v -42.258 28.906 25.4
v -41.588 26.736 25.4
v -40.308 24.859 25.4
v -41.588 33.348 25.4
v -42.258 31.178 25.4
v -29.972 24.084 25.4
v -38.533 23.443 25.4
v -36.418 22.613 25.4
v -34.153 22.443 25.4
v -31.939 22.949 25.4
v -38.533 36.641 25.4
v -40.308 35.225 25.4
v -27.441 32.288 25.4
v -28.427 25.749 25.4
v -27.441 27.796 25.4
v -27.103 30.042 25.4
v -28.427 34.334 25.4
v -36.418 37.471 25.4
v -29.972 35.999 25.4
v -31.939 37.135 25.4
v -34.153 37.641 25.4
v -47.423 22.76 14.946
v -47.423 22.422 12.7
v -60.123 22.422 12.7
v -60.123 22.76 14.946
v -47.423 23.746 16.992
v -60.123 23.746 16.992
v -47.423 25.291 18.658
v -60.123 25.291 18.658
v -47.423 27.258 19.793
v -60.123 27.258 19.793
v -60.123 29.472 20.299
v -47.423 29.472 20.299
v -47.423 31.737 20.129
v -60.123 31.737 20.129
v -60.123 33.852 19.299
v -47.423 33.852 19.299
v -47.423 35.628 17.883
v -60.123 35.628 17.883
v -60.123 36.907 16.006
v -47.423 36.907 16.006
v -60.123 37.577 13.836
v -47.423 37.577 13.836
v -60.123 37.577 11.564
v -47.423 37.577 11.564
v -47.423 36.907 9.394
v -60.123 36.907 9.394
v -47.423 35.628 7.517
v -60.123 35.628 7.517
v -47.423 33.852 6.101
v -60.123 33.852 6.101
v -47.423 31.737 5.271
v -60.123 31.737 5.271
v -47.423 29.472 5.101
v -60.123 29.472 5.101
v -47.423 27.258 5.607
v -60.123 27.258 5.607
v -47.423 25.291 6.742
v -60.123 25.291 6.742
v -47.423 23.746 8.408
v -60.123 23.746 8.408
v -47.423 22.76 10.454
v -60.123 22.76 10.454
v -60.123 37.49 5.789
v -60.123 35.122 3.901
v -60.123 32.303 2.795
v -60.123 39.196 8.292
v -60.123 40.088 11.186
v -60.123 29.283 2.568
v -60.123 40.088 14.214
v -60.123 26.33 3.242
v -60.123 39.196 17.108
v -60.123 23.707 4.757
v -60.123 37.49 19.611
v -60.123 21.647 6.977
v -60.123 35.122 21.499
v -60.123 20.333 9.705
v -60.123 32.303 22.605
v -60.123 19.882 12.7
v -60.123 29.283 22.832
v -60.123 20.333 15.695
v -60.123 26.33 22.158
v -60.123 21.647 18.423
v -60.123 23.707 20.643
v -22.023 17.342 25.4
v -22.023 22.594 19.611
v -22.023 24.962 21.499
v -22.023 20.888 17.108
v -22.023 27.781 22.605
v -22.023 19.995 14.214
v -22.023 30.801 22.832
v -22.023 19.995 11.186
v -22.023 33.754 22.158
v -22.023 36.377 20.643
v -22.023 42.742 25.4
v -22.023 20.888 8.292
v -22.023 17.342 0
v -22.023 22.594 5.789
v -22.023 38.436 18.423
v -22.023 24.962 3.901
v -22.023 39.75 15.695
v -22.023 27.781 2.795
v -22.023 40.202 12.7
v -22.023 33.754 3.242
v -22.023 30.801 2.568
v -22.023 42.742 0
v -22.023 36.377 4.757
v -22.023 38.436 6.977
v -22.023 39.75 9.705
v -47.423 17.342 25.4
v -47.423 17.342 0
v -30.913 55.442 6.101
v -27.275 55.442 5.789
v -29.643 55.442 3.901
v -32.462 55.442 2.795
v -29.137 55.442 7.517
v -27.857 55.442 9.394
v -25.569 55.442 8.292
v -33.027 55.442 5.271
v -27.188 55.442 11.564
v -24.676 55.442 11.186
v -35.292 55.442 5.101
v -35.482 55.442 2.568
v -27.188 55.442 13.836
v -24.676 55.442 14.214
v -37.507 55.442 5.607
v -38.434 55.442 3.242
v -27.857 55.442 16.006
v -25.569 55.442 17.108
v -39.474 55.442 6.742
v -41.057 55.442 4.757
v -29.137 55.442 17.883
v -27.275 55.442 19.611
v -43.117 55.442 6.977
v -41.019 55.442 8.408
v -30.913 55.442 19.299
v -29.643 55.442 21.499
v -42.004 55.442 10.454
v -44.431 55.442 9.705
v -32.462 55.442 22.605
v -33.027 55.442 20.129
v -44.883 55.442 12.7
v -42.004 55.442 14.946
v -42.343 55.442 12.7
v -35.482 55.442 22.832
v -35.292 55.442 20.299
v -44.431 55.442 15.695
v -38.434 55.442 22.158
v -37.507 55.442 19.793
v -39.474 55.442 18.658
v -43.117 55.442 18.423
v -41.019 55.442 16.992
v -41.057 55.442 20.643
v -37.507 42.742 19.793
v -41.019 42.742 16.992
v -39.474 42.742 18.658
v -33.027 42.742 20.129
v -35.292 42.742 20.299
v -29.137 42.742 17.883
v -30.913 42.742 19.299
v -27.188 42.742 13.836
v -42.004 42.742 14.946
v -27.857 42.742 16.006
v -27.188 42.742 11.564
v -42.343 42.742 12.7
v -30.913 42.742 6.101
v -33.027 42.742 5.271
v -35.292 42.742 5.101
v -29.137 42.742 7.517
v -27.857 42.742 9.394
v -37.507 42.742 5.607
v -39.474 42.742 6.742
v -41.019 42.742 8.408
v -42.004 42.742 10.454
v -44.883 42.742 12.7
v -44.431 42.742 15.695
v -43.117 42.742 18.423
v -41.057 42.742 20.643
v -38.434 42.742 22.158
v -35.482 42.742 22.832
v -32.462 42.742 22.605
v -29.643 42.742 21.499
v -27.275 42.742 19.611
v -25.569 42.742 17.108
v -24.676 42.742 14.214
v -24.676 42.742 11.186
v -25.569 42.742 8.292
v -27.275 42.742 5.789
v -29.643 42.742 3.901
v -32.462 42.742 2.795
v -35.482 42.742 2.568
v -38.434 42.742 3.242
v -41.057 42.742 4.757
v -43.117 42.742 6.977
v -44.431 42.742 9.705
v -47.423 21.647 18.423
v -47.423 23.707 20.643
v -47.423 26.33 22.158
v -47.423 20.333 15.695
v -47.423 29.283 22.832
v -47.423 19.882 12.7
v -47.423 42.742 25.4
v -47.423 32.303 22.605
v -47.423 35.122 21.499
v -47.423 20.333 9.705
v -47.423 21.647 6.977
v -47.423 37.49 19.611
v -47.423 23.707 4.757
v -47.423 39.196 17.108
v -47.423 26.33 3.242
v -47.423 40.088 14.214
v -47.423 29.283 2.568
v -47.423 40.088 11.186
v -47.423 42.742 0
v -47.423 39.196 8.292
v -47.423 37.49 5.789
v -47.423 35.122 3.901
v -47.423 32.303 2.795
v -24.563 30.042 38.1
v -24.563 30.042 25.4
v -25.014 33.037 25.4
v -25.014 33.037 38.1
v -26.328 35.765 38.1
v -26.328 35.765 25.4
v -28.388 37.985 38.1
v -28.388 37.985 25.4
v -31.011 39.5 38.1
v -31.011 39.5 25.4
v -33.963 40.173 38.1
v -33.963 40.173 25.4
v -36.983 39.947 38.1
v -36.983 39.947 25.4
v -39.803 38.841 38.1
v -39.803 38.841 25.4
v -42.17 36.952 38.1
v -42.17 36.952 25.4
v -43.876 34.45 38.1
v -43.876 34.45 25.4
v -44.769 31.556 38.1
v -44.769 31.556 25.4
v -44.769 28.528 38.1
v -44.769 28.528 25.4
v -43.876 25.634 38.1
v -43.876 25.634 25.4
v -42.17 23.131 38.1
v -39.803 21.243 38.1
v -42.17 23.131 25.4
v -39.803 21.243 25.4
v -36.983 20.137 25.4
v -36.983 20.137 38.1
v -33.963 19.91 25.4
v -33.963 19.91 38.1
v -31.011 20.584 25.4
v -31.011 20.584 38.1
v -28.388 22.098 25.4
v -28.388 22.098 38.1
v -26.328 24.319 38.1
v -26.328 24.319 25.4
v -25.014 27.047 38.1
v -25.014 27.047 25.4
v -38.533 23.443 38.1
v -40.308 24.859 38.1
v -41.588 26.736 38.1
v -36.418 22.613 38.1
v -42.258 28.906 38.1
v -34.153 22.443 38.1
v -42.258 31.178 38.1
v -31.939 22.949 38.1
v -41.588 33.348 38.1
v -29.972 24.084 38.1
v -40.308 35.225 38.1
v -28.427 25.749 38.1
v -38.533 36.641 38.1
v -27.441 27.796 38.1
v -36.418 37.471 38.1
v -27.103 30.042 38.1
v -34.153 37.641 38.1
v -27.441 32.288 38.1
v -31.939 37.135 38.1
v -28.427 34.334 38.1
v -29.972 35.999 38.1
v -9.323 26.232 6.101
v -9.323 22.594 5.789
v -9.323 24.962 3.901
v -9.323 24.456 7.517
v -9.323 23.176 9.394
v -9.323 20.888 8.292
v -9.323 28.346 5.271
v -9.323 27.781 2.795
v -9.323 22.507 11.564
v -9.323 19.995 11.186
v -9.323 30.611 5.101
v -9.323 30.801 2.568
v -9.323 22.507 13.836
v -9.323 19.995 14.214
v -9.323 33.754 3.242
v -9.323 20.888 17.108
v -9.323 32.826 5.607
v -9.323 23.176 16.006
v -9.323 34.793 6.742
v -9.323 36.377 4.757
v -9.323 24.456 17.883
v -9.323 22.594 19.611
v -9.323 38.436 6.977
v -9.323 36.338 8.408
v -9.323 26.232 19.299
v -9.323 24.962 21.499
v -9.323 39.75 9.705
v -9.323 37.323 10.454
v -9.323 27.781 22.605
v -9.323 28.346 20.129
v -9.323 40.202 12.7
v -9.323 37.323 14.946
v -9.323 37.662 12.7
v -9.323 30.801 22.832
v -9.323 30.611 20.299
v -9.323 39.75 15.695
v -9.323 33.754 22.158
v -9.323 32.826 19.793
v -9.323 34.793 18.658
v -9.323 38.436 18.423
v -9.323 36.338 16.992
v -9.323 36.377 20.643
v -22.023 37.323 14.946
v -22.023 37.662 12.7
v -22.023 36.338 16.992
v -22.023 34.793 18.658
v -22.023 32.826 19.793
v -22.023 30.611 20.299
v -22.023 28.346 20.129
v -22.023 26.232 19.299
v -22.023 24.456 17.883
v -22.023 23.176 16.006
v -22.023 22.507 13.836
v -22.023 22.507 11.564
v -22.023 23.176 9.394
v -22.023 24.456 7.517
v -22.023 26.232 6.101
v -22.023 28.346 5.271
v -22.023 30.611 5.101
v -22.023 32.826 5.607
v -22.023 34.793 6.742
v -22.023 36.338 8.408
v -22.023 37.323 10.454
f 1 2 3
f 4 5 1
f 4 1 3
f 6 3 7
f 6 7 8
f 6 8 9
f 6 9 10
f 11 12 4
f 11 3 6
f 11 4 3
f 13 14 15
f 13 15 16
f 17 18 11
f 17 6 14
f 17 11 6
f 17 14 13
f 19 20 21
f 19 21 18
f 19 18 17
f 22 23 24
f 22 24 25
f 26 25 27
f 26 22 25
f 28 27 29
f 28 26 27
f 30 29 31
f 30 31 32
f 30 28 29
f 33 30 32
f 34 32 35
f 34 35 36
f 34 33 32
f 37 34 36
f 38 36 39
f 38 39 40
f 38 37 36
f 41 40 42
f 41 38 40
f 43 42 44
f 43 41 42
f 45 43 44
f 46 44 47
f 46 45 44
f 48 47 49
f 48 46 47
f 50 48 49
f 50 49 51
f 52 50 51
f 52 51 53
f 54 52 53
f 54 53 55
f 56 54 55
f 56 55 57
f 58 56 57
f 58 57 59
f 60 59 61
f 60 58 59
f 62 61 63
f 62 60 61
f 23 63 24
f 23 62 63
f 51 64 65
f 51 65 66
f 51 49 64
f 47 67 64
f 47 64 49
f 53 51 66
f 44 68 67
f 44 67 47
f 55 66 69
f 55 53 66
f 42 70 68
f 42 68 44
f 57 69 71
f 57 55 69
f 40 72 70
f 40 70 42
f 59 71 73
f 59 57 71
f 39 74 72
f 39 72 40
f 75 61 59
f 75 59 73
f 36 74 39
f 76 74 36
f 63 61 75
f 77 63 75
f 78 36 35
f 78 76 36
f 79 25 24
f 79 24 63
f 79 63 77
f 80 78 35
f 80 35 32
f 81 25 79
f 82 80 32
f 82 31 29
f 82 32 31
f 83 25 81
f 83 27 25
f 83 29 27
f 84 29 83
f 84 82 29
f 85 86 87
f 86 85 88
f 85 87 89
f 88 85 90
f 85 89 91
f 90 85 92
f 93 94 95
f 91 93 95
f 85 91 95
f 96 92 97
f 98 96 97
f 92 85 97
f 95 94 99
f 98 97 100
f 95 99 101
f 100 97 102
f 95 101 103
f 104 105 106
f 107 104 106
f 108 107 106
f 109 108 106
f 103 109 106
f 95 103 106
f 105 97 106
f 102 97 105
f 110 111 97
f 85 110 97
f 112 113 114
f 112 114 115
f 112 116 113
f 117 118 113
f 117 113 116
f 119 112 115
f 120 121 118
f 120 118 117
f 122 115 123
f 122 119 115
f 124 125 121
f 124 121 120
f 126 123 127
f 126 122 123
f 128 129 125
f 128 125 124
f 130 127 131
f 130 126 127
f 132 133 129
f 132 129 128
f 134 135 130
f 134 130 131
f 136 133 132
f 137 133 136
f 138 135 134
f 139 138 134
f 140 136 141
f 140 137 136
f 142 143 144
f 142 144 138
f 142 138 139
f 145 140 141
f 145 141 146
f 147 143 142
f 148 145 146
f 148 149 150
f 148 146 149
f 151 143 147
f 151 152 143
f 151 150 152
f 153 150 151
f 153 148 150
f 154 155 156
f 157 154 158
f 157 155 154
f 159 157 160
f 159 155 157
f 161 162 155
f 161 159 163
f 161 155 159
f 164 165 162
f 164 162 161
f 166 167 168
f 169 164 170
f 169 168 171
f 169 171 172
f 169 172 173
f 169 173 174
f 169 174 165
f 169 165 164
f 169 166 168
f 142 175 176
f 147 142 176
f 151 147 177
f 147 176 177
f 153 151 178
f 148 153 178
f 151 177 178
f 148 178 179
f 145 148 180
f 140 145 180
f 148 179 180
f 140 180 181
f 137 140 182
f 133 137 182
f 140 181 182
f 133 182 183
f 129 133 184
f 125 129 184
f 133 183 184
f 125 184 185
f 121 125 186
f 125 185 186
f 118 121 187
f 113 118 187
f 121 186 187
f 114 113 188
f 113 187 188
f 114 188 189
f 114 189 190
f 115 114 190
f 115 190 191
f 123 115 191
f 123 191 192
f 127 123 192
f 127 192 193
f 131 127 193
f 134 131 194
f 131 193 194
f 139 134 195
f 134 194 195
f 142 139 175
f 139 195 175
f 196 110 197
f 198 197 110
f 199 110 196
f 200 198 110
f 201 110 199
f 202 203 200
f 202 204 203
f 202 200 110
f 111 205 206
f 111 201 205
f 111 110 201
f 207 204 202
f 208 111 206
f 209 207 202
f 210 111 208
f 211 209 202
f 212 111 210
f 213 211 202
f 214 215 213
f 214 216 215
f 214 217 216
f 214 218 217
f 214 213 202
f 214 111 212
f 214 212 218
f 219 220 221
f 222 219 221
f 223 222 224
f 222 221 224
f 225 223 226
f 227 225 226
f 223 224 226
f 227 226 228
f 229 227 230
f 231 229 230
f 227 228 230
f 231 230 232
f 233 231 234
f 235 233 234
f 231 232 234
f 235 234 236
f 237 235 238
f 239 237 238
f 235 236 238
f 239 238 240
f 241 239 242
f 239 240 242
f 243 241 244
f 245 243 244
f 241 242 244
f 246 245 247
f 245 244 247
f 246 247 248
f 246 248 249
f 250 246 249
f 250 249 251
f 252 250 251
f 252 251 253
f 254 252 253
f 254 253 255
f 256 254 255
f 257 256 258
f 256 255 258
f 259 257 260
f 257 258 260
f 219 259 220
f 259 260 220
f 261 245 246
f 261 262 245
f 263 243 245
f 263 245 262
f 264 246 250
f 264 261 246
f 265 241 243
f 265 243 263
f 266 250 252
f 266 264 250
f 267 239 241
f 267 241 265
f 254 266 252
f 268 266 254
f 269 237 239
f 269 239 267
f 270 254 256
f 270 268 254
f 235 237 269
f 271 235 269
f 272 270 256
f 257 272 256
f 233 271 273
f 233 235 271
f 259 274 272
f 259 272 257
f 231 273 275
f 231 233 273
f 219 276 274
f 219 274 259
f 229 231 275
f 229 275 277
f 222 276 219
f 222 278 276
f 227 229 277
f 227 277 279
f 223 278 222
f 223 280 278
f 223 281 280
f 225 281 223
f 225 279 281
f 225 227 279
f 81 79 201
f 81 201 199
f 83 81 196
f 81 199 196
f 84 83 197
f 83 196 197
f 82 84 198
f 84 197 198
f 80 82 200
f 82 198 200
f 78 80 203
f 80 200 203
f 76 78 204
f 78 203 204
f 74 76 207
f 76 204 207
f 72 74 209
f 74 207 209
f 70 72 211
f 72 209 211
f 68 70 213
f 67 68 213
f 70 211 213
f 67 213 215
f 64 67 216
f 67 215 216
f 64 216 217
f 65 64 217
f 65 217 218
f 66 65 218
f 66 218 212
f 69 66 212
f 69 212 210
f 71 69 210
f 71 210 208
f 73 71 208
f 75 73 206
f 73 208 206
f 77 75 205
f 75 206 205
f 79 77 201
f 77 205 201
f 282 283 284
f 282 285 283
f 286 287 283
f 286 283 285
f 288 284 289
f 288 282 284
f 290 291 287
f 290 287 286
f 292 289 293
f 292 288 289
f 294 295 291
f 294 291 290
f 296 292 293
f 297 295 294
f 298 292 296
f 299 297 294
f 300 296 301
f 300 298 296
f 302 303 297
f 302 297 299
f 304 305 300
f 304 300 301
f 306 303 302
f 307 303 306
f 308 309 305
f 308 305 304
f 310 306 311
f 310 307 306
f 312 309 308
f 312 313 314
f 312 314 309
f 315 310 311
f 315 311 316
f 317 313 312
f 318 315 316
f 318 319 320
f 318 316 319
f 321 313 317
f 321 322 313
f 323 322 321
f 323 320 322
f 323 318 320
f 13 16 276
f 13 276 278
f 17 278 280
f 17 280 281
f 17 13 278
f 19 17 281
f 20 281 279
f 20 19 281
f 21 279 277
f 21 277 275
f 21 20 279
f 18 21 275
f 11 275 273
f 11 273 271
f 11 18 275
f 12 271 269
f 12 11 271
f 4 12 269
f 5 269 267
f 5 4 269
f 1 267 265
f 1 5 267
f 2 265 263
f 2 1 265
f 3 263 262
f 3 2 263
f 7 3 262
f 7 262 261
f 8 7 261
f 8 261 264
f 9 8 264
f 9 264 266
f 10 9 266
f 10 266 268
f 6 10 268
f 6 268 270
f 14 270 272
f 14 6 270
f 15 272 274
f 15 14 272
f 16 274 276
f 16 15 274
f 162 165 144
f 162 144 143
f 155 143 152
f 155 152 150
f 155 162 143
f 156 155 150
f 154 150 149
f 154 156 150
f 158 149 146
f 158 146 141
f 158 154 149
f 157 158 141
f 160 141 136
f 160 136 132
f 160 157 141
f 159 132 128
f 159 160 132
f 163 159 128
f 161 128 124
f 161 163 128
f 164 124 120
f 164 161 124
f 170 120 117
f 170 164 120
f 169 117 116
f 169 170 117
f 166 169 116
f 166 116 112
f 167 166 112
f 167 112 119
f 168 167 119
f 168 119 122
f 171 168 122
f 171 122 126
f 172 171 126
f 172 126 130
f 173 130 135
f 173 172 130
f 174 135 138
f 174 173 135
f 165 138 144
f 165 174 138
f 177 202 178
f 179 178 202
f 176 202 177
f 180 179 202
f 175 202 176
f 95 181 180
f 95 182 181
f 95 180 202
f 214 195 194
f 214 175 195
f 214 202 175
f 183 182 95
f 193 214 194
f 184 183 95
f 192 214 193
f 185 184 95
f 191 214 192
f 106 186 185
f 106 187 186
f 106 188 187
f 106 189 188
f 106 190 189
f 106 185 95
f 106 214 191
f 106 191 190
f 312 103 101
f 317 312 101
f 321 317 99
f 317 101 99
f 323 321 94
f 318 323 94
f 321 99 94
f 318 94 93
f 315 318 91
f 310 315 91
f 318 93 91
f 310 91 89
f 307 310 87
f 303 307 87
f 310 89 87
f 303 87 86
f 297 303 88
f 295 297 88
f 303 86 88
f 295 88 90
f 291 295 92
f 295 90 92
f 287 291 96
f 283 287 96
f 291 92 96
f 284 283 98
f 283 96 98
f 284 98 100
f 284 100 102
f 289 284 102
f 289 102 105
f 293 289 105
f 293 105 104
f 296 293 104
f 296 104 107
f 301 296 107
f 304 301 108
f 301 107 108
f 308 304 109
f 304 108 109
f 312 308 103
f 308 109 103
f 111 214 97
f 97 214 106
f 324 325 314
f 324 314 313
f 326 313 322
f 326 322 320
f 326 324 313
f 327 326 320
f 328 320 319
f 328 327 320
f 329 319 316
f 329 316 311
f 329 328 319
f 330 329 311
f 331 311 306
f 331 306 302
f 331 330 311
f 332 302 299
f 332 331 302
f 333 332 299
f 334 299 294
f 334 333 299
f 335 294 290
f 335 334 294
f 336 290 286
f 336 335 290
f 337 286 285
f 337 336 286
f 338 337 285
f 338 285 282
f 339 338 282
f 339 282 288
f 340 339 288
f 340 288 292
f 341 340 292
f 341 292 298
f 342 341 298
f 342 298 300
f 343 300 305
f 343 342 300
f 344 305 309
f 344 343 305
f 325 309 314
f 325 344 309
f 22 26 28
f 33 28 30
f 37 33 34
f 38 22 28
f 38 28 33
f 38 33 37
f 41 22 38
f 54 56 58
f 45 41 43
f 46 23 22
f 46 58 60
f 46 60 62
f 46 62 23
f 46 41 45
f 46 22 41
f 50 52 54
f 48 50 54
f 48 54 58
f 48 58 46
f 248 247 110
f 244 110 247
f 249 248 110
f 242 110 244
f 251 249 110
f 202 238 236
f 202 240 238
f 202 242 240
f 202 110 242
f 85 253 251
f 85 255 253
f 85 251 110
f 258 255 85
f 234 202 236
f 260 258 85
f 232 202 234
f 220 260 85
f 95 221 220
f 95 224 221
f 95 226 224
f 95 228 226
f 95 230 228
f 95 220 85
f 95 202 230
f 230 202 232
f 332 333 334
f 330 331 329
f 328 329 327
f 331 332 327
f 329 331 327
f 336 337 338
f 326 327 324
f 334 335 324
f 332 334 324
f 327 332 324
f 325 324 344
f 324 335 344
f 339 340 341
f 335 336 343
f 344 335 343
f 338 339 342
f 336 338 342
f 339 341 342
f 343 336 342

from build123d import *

# Parameters (mm, degrees)
F0_W     = 25.4
F0_H     = 25.4
F1_DEPTH = 25.4
F3_R     = 10.16
F3_R_2   = 7.62
F4_DEPTH = 12.7
F5_R     = 10.16
F5_R_2   = 7.62
F7_DEPTH = 12.7
F6_R     = 10.16
F6_R_2   = 7.62
F8_DEPTH = 12.7
F2_R     = 10.16
F2_R_2   = 7.62
F9_DEPTH = 12.7


with BuildPart() as f1:
    # F0 (on Top) → F1 (new body)
    with BuildSketch(Plane.XY):
        with Locations((-34.72263, 30.04187)):
            Rectangle(F0_W, F0_H)
    extrude(amount=F1_DEPTH)

    # F3 (on face) → F4 (join)
    with BuildSketch(Plane(origin=(0, 42.74187, 0), x_dir=(-1, 0, 0), z_dir=(0, 1, 0))):
        with Locations((34.72263, 12.7)):
            Circle(F3_R)
        with Locations((34.72263, 12.7)):
            Circle(F3_R_2, mode=Mode.SUBTRACT)
    extrude(amount=F4_DEPTH)

    # F5 (on face) → F7 (join)
    with BuildSketch(Plane.XY.offset(25.4)):
        with Locations((-34.72263, 30.04187)):
            Circle(F5_R)
        with Locations((-34.72263, 30.04187)):
            Circle(F5_R_2, mode=Mode.SUBTRACT)
    extrude(amount=F7_DEPTH)

    # F6 (on face) → F8 (join)
    with BuildSketch(Plane(origin=(-47.42263, 0, 0), x_dir=(0, -1, 0), z_dir=(-1, 0, 0))):
        with Locations((-30.04187, 12.7)):
            Circle(F6_R)
        with Locations((-30.04187, 12.7)):
            Circle(F6_R_2, mode=Mode.SUBTRACT)
    extrude(amount=F8_DEPTH)

    # F2 (on face) → F9 (join)
    with BuildSketch(Plane.YZ.offset(-22.02263)):
        with Locations((30.04187, 12.7)):
            Circle(F2_R)
        with Locations((30.04187, 12.7)):
            Circle(F2_R_2, mode=Mode.SUBTRACT)
    extrude(amount=F9_DEPTH)


solid = f1.part
